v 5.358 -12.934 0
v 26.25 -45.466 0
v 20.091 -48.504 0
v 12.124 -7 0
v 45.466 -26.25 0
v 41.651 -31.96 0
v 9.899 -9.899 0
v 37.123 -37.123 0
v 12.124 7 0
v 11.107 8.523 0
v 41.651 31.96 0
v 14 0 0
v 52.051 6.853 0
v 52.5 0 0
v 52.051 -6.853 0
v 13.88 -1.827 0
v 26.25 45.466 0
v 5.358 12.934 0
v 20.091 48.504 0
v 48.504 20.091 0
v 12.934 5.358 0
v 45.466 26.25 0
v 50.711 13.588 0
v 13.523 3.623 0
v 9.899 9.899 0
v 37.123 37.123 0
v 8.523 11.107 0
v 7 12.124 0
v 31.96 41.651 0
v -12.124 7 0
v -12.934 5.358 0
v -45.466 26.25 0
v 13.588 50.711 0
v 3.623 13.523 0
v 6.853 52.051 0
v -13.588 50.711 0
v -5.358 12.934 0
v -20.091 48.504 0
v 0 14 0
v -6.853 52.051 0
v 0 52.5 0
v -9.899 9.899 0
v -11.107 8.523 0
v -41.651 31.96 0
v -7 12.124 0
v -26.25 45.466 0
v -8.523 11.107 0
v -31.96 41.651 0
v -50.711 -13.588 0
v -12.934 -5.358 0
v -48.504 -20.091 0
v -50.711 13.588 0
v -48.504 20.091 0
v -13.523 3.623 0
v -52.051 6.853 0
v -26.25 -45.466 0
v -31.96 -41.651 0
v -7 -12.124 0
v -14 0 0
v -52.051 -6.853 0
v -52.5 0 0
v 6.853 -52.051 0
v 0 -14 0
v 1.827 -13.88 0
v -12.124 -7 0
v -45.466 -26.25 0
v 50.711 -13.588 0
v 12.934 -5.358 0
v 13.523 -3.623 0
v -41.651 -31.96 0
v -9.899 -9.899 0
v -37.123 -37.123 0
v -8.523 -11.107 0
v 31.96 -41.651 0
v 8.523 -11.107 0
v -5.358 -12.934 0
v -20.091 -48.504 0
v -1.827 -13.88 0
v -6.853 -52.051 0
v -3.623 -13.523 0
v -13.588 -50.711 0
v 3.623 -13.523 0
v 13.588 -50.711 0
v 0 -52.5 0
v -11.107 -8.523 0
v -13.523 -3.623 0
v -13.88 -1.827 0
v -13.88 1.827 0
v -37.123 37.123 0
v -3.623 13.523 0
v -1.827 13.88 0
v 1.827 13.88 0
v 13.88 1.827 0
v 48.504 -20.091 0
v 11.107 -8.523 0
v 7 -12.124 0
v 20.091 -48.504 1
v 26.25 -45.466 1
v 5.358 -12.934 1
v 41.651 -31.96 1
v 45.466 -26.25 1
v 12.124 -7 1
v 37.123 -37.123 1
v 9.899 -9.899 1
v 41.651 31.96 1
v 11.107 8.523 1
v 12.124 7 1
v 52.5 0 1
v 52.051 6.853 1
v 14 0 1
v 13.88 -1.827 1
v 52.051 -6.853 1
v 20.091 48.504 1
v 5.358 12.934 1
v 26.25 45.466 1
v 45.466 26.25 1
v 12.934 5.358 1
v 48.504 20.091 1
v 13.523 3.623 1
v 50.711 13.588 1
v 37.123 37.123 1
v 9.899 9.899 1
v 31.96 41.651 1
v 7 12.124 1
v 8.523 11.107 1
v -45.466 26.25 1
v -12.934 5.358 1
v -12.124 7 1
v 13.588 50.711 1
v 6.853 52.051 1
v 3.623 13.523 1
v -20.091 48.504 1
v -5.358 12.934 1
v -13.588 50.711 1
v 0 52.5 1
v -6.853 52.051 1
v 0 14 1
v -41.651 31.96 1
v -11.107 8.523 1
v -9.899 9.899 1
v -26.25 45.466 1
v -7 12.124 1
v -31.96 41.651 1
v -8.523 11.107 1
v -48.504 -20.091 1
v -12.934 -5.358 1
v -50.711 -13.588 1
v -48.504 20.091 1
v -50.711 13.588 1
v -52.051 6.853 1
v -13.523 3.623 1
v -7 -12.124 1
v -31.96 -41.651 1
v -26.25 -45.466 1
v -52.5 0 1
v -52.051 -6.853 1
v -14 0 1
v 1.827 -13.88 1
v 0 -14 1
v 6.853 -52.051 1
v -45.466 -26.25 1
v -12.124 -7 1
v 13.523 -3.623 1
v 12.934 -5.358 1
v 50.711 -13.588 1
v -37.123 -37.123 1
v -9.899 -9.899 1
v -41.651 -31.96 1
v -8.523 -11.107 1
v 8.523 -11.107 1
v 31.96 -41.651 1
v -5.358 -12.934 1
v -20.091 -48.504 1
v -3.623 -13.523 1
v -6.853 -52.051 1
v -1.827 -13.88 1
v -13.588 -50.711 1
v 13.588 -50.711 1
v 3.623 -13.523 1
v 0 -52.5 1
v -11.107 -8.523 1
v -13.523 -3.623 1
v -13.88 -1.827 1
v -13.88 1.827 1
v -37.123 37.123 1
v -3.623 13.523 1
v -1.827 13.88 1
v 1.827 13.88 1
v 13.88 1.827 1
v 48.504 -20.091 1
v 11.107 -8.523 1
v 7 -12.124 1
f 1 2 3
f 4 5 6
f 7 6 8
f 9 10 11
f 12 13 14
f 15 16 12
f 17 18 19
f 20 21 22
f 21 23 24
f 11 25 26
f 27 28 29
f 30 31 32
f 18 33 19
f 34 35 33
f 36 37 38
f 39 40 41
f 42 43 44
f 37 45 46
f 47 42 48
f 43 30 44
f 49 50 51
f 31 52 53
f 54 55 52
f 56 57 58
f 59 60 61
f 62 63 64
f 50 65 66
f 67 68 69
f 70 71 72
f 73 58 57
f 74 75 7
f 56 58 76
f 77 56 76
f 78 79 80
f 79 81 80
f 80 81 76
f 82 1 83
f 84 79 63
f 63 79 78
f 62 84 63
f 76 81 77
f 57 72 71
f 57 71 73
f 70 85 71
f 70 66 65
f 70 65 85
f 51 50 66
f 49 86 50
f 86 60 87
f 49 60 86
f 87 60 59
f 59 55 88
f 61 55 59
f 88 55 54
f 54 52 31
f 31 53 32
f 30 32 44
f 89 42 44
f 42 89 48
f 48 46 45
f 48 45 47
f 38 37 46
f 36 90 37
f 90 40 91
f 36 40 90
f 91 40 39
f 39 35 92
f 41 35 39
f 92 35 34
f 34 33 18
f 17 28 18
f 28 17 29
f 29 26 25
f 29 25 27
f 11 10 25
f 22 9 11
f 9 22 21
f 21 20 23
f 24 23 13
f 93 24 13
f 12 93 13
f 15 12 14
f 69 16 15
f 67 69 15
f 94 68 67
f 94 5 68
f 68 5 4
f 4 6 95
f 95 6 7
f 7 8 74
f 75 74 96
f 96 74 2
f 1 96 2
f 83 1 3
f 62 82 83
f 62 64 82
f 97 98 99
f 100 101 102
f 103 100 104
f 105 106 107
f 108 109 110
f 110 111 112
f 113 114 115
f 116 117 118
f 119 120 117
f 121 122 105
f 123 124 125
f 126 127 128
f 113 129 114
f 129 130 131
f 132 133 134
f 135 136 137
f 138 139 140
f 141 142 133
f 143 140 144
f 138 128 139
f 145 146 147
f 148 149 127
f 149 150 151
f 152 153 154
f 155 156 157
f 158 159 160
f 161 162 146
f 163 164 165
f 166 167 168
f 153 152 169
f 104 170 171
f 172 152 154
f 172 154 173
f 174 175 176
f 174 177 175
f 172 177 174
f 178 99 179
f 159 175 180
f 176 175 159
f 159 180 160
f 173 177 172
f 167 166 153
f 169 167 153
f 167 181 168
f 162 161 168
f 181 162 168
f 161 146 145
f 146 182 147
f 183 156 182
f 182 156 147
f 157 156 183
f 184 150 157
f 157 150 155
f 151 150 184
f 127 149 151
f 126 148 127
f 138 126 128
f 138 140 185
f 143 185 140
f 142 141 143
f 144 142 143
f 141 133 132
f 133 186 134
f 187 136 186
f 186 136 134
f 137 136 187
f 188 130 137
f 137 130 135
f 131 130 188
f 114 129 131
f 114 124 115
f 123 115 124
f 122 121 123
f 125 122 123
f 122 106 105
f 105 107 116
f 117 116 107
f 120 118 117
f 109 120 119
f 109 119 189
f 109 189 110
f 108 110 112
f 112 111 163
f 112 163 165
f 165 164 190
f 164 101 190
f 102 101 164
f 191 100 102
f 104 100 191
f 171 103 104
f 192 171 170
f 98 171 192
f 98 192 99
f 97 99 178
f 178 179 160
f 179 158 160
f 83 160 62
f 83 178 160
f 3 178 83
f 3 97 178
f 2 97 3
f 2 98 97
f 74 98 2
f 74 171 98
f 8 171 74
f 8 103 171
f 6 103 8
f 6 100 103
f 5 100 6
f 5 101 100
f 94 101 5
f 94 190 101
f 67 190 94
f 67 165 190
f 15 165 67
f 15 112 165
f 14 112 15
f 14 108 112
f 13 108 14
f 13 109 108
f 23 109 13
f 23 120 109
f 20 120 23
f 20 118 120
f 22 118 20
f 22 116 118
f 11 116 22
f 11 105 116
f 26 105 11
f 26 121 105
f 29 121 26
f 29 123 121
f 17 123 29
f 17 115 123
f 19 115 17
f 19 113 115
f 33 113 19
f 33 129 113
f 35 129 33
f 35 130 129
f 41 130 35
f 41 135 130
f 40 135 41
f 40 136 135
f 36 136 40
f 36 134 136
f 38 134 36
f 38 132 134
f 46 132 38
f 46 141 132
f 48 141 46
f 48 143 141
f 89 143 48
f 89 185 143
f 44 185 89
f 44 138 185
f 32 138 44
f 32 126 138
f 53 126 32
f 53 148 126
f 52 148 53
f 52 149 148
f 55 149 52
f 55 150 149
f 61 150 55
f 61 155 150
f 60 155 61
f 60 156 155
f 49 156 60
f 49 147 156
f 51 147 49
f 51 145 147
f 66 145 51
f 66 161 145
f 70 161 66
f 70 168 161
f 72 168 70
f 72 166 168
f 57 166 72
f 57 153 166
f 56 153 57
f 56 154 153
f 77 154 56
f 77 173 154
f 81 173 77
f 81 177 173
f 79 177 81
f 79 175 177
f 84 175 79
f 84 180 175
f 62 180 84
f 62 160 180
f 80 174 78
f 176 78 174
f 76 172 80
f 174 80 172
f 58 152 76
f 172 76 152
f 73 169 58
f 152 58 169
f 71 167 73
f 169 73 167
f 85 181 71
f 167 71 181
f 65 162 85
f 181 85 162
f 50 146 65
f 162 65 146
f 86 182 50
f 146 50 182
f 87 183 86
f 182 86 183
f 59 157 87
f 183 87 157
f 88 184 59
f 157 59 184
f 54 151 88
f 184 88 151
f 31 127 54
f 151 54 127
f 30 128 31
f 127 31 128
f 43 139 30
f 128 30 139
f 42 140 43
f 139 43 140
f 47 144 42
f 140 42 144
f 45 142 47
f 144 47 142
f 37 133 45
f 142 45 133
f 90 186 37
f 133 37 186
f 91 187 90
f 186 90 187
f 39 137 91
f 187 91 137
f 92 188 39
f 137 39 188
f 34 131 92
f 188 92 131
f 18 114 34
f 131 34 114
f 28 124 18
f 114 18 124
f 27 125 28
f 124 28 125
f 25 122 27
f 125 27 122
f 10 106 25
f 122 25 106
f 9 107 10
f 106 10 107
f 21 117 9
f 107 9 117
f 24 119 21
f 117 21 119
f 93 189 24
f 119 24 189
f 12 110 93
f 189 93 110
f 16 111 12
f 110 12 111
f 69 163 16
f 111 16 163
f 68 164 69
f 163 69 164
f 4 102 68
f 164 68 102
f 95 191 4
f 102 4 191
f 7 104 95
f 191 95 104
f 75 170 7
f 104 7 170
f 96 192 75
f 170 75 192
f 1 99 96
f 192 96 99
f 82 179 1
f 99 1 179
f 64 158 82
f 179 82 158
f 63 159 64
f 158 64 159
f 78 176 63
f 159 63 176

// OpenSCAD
// Side Brush Clearance Jig
// Verifies the 5-arm side brush clears the chassis and bumper.
// Prints a thin profile of the brush sweep area.

brush_radius = 105/2;  // mm (estimate)
hub_radius   =  28/2;  // mm (estimate)
thickness    =   1;     // mm — thin template

$fn = 48;

module jig() {
    // Outer sweep ring (thin disc)
    difference() {
        circle(r=brush_radius);
        circle(r=hub_radius);
    }
}

// Extrude to thin template
linear_extrude(height=thickness)
    jig();
